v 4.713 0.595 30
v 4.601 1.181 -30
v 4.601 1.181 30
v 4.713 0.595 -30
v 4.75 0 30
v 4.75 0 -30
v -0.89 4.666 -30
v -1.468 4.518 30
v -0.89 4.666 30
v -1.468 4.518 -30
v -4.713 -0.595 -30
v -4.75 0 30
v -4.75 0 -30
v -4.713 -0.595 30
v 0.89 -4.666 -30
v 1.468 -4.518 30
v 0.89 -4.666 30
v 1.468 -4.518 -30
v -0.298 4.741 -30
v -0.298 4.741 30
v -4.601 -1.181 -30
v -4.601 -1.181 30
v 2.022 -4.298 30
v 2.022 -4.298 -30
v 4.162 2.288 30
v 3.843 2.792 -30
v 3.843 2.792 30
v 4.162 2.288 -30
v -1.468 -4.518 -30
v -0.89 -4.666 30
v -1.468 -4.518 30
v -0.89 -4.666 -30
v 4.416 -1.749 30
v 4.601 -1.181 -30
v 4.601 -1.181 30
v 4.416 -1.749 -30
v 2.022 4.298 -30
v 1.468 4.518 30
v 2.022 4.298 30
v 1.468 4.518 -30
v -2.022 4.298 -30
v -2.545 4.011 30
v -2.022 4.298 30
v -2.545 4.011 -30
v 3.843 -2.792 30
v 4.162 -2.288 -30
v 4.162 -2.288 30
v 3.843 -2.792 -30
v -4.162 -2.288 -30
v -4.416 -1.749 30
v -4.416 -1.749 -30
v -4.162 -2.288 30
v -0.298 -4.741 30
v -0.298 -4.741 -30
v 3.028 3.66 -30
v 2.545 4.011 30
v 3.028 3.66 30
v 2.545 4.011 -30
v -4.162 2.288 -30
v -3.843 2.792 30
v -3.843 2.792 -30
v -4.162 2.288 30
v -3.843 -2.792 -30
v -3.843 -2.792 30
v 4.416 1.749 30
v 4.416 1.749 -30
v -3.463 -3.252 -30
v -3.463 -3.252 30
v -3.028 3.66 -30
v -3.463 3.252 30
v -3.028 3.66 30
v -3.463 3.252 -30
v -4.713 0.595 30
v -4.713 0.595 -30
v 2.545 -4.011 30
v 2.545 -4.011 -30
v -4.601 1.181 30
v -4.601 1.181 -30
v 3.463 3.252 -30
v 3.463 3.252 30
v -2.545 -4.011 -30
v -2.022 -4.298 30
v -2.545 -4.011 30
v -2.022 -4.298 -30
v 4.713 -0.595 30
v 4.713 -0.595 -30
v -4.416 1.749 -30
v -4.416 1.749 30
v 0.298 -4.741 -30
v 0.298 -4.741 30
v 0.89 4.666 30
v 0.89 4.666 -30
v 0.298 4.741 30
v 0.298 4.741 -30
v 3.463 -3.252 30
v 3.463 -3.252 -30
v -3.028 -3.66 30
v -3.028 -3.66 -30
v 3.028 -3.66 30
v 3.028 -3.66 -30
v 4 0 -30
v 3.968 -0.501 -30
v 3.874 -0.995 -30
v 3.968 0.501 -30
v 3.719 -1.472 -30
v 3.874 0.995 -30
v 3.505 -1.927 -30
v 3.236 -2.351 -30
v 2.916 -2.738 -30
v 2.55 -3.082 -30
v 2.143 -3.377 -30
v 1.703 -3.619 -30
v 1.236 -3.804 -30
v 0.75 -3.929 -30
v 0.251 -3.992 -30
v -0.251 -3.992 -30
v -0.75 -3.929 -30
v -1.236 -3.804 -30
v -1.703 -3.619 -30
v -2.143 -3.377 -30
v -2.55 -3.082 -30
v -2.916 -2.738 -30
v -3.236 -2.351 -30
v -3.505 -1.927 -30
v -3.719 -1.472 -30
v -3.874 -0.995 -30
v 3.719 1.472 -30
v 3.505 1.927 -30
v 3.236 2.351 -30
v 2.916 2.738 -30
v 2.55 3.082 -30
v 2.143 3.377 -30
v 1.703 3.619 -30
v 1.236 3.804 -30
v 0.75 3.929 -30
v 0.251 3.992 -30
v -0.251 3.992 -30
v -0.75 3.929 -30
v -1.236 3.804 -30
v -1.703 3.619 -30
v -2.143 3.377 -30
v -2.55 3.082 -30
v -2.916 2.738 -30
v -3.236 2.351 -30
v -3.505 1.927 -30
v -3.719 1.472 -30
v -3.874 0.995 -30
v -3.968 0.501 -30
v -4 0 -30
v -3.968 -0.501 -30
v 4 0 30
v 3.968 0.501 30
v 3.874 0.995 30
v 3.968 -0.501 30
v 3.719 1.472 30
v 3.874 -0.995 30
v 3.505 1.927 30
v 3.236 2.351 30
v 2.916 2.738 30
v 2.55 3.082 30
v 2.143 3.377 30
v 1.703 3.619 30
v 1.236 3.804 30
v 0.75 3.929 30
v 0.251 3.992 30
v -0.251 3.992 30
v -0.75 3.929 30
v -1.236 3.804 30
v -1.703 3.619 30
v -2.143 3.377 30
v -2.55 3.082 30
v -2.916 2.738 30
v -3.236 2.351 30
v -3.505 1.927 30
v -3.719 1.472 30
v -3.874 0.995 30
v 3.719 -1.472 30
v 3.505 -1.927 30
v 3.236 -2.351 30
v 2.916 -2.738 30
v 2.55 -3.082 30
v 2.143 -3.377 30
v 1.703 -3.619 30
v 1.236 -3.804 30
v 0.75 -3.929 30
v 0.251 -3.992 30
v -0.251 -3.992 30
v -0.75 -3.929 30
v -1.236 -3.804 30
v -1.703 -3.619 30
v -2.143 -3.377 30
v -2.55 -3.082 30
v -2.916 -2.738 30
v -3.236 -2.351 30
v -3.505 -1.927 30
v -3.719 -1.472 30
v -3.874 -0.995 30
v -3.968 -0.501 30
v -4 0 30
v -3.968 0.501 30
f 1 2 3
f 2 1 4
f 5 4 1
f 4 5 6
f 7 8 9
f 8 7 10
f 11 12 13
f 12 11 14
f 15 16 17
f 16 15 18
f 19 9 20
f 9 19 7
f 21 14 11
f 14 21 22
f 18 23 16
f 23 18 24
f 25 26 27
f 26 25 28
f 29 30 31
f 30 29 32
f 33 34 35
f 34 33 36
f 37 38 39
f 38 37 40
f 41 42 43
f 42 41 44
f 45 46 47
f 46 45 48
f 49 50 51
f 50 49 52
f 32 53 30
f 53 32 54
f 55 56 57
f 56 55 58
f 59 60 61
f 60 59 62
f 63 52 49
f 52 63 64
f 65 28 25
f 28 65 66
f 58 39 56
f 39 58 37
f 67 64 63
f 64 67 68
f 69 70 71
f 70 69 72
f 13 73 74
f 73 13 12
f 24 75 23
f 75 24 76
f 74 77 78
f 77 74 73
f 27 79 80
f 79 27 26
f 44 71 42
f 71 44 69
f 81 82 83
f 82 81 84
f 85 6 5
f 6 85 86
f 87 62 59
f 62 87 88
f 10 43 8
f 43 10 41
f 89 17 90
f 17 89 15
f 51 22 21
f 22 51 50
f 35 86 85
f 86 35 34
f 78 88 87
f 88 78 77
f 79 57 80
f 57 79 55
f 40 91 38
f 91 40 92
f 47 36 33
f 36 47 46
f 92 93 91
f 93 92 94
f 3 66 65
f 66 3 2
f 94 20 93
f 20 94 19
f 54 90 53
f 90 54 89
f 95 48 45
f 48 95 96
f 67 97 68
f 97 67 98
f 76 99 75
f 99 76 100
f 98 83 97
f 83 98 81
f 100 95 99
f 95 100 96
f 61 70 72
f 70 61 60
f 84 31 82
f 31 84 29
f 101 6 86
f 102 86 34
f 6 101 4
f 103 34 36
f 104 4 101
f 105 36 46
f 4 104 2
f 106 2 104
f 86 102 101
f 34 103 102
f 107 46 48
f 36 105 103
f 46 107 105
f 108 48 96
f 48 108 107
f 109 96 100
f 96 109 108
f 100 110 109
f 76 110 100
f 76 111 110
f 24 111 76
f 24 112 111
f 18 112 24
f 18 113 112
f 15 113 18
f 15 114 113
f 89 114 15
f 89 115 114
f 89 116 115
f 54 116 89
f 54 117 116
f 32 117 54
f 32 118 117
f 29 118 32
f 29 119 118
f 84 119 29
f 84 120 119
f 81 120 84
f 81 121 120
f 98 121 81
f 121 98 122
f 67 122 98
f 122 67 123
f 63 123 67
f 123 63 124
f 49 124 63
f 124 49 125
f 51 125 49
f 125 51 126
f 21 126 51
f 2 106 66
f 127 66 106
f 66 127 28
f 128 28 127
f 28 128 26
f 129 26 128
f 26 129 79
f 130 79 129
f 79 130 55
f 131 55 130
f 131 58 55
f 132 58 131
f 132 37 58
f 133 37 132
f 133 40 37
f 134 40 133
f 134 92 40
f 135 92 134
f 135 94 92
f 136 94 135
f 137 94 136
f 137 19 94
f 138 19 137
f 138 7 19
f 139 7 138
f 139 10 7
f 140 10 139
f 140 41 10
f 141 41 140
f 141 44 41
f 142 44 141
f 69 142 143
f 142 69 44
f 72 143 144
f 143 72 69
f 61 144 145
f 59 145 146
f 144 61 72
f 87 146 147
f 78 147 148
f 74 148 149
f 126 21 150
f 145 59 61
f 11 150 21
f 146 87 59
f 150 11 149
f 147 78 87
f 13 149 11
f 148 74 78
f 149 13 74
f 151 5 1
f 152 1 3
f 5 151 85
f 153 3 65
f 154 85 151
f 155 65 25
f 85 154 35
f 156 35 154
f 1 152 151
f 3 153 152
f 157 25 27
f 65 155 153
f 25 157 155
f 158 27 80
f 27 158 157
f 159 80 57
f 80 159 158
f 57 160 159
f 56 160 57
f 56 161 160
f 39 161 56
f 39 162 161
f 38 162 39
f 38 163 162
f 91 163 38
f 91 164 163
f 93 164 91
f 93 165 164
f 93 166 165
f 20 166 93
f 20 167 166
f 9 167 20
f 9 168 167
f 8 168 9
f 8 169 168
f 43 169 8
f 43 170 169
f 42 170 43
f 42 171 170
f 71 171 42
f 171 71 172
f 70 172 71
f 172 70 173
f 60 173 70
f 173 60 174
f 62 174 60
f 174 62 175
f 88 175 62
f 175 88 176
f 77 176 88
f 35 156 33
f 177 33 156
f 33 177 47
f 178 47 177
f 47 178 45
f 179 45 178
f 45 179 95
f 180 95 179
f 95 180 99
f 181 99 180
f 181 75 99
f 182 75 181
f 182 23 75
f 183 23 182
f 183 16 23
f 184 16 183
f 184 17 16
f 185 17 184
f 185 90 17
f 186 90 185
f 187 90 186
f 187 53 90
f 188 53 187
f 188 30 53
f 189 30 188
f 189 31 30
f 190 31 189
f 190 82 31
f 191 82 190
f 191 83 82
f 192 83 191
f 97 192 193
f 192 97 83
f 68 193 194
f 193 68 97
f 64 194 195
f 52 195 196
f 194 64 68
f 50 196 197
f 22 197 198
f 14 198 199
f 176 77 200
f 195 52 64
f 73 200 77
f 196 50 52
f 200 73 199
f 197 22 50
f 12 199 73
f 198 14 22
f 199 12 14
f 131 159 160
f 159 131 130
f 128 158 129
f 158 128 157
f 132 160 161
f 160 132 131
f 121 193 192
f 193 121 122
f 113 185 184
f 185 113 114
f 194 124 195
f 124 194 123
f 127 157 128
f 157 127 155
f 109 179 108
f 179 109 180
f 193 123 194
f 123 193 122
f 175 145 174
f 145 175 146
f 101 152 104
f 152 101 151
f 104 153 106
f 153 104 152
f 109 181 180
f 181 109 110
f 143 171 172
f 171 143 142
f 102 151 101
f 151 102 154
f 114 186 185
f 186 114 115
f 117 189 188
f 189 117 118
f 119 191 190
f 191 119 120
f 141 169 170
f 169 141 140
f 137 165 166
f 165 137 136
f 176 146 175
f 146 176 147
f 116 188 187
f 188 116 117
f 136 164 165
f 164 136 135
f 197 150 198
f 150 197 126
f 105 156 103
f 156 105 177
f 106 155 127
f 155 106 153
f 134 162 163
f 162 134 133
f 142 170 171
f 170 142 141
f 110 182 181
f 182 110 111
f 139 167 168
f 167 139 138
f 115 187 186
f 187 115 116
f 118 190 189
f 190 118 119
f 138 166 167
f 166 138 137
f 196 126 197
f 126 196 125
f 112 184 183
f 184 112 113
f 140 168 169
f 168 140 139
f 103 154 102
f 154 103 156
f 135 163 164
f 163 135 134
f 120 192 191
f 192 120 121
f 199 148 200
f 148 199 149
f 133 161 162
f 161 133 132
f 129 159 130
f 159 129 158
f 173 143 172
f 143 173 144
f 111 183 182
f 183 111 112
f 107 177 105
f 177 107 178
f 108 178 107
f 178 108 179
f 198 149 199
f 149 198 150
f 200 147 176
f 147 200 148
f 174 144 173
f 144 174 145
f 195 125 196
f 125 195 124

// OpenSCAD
$fn = 50;


difference() {
	union() {
		translate(v = [0, 0, -30.0000000000]) {
			cylinder(h = 60, r = 4.7500000000);
		}
	}
	union() {
		translate(v = [0, 0, -100.0000000000]) {
			cylinder(h = 200, r = 4.0000000000);
		}
	}
}
